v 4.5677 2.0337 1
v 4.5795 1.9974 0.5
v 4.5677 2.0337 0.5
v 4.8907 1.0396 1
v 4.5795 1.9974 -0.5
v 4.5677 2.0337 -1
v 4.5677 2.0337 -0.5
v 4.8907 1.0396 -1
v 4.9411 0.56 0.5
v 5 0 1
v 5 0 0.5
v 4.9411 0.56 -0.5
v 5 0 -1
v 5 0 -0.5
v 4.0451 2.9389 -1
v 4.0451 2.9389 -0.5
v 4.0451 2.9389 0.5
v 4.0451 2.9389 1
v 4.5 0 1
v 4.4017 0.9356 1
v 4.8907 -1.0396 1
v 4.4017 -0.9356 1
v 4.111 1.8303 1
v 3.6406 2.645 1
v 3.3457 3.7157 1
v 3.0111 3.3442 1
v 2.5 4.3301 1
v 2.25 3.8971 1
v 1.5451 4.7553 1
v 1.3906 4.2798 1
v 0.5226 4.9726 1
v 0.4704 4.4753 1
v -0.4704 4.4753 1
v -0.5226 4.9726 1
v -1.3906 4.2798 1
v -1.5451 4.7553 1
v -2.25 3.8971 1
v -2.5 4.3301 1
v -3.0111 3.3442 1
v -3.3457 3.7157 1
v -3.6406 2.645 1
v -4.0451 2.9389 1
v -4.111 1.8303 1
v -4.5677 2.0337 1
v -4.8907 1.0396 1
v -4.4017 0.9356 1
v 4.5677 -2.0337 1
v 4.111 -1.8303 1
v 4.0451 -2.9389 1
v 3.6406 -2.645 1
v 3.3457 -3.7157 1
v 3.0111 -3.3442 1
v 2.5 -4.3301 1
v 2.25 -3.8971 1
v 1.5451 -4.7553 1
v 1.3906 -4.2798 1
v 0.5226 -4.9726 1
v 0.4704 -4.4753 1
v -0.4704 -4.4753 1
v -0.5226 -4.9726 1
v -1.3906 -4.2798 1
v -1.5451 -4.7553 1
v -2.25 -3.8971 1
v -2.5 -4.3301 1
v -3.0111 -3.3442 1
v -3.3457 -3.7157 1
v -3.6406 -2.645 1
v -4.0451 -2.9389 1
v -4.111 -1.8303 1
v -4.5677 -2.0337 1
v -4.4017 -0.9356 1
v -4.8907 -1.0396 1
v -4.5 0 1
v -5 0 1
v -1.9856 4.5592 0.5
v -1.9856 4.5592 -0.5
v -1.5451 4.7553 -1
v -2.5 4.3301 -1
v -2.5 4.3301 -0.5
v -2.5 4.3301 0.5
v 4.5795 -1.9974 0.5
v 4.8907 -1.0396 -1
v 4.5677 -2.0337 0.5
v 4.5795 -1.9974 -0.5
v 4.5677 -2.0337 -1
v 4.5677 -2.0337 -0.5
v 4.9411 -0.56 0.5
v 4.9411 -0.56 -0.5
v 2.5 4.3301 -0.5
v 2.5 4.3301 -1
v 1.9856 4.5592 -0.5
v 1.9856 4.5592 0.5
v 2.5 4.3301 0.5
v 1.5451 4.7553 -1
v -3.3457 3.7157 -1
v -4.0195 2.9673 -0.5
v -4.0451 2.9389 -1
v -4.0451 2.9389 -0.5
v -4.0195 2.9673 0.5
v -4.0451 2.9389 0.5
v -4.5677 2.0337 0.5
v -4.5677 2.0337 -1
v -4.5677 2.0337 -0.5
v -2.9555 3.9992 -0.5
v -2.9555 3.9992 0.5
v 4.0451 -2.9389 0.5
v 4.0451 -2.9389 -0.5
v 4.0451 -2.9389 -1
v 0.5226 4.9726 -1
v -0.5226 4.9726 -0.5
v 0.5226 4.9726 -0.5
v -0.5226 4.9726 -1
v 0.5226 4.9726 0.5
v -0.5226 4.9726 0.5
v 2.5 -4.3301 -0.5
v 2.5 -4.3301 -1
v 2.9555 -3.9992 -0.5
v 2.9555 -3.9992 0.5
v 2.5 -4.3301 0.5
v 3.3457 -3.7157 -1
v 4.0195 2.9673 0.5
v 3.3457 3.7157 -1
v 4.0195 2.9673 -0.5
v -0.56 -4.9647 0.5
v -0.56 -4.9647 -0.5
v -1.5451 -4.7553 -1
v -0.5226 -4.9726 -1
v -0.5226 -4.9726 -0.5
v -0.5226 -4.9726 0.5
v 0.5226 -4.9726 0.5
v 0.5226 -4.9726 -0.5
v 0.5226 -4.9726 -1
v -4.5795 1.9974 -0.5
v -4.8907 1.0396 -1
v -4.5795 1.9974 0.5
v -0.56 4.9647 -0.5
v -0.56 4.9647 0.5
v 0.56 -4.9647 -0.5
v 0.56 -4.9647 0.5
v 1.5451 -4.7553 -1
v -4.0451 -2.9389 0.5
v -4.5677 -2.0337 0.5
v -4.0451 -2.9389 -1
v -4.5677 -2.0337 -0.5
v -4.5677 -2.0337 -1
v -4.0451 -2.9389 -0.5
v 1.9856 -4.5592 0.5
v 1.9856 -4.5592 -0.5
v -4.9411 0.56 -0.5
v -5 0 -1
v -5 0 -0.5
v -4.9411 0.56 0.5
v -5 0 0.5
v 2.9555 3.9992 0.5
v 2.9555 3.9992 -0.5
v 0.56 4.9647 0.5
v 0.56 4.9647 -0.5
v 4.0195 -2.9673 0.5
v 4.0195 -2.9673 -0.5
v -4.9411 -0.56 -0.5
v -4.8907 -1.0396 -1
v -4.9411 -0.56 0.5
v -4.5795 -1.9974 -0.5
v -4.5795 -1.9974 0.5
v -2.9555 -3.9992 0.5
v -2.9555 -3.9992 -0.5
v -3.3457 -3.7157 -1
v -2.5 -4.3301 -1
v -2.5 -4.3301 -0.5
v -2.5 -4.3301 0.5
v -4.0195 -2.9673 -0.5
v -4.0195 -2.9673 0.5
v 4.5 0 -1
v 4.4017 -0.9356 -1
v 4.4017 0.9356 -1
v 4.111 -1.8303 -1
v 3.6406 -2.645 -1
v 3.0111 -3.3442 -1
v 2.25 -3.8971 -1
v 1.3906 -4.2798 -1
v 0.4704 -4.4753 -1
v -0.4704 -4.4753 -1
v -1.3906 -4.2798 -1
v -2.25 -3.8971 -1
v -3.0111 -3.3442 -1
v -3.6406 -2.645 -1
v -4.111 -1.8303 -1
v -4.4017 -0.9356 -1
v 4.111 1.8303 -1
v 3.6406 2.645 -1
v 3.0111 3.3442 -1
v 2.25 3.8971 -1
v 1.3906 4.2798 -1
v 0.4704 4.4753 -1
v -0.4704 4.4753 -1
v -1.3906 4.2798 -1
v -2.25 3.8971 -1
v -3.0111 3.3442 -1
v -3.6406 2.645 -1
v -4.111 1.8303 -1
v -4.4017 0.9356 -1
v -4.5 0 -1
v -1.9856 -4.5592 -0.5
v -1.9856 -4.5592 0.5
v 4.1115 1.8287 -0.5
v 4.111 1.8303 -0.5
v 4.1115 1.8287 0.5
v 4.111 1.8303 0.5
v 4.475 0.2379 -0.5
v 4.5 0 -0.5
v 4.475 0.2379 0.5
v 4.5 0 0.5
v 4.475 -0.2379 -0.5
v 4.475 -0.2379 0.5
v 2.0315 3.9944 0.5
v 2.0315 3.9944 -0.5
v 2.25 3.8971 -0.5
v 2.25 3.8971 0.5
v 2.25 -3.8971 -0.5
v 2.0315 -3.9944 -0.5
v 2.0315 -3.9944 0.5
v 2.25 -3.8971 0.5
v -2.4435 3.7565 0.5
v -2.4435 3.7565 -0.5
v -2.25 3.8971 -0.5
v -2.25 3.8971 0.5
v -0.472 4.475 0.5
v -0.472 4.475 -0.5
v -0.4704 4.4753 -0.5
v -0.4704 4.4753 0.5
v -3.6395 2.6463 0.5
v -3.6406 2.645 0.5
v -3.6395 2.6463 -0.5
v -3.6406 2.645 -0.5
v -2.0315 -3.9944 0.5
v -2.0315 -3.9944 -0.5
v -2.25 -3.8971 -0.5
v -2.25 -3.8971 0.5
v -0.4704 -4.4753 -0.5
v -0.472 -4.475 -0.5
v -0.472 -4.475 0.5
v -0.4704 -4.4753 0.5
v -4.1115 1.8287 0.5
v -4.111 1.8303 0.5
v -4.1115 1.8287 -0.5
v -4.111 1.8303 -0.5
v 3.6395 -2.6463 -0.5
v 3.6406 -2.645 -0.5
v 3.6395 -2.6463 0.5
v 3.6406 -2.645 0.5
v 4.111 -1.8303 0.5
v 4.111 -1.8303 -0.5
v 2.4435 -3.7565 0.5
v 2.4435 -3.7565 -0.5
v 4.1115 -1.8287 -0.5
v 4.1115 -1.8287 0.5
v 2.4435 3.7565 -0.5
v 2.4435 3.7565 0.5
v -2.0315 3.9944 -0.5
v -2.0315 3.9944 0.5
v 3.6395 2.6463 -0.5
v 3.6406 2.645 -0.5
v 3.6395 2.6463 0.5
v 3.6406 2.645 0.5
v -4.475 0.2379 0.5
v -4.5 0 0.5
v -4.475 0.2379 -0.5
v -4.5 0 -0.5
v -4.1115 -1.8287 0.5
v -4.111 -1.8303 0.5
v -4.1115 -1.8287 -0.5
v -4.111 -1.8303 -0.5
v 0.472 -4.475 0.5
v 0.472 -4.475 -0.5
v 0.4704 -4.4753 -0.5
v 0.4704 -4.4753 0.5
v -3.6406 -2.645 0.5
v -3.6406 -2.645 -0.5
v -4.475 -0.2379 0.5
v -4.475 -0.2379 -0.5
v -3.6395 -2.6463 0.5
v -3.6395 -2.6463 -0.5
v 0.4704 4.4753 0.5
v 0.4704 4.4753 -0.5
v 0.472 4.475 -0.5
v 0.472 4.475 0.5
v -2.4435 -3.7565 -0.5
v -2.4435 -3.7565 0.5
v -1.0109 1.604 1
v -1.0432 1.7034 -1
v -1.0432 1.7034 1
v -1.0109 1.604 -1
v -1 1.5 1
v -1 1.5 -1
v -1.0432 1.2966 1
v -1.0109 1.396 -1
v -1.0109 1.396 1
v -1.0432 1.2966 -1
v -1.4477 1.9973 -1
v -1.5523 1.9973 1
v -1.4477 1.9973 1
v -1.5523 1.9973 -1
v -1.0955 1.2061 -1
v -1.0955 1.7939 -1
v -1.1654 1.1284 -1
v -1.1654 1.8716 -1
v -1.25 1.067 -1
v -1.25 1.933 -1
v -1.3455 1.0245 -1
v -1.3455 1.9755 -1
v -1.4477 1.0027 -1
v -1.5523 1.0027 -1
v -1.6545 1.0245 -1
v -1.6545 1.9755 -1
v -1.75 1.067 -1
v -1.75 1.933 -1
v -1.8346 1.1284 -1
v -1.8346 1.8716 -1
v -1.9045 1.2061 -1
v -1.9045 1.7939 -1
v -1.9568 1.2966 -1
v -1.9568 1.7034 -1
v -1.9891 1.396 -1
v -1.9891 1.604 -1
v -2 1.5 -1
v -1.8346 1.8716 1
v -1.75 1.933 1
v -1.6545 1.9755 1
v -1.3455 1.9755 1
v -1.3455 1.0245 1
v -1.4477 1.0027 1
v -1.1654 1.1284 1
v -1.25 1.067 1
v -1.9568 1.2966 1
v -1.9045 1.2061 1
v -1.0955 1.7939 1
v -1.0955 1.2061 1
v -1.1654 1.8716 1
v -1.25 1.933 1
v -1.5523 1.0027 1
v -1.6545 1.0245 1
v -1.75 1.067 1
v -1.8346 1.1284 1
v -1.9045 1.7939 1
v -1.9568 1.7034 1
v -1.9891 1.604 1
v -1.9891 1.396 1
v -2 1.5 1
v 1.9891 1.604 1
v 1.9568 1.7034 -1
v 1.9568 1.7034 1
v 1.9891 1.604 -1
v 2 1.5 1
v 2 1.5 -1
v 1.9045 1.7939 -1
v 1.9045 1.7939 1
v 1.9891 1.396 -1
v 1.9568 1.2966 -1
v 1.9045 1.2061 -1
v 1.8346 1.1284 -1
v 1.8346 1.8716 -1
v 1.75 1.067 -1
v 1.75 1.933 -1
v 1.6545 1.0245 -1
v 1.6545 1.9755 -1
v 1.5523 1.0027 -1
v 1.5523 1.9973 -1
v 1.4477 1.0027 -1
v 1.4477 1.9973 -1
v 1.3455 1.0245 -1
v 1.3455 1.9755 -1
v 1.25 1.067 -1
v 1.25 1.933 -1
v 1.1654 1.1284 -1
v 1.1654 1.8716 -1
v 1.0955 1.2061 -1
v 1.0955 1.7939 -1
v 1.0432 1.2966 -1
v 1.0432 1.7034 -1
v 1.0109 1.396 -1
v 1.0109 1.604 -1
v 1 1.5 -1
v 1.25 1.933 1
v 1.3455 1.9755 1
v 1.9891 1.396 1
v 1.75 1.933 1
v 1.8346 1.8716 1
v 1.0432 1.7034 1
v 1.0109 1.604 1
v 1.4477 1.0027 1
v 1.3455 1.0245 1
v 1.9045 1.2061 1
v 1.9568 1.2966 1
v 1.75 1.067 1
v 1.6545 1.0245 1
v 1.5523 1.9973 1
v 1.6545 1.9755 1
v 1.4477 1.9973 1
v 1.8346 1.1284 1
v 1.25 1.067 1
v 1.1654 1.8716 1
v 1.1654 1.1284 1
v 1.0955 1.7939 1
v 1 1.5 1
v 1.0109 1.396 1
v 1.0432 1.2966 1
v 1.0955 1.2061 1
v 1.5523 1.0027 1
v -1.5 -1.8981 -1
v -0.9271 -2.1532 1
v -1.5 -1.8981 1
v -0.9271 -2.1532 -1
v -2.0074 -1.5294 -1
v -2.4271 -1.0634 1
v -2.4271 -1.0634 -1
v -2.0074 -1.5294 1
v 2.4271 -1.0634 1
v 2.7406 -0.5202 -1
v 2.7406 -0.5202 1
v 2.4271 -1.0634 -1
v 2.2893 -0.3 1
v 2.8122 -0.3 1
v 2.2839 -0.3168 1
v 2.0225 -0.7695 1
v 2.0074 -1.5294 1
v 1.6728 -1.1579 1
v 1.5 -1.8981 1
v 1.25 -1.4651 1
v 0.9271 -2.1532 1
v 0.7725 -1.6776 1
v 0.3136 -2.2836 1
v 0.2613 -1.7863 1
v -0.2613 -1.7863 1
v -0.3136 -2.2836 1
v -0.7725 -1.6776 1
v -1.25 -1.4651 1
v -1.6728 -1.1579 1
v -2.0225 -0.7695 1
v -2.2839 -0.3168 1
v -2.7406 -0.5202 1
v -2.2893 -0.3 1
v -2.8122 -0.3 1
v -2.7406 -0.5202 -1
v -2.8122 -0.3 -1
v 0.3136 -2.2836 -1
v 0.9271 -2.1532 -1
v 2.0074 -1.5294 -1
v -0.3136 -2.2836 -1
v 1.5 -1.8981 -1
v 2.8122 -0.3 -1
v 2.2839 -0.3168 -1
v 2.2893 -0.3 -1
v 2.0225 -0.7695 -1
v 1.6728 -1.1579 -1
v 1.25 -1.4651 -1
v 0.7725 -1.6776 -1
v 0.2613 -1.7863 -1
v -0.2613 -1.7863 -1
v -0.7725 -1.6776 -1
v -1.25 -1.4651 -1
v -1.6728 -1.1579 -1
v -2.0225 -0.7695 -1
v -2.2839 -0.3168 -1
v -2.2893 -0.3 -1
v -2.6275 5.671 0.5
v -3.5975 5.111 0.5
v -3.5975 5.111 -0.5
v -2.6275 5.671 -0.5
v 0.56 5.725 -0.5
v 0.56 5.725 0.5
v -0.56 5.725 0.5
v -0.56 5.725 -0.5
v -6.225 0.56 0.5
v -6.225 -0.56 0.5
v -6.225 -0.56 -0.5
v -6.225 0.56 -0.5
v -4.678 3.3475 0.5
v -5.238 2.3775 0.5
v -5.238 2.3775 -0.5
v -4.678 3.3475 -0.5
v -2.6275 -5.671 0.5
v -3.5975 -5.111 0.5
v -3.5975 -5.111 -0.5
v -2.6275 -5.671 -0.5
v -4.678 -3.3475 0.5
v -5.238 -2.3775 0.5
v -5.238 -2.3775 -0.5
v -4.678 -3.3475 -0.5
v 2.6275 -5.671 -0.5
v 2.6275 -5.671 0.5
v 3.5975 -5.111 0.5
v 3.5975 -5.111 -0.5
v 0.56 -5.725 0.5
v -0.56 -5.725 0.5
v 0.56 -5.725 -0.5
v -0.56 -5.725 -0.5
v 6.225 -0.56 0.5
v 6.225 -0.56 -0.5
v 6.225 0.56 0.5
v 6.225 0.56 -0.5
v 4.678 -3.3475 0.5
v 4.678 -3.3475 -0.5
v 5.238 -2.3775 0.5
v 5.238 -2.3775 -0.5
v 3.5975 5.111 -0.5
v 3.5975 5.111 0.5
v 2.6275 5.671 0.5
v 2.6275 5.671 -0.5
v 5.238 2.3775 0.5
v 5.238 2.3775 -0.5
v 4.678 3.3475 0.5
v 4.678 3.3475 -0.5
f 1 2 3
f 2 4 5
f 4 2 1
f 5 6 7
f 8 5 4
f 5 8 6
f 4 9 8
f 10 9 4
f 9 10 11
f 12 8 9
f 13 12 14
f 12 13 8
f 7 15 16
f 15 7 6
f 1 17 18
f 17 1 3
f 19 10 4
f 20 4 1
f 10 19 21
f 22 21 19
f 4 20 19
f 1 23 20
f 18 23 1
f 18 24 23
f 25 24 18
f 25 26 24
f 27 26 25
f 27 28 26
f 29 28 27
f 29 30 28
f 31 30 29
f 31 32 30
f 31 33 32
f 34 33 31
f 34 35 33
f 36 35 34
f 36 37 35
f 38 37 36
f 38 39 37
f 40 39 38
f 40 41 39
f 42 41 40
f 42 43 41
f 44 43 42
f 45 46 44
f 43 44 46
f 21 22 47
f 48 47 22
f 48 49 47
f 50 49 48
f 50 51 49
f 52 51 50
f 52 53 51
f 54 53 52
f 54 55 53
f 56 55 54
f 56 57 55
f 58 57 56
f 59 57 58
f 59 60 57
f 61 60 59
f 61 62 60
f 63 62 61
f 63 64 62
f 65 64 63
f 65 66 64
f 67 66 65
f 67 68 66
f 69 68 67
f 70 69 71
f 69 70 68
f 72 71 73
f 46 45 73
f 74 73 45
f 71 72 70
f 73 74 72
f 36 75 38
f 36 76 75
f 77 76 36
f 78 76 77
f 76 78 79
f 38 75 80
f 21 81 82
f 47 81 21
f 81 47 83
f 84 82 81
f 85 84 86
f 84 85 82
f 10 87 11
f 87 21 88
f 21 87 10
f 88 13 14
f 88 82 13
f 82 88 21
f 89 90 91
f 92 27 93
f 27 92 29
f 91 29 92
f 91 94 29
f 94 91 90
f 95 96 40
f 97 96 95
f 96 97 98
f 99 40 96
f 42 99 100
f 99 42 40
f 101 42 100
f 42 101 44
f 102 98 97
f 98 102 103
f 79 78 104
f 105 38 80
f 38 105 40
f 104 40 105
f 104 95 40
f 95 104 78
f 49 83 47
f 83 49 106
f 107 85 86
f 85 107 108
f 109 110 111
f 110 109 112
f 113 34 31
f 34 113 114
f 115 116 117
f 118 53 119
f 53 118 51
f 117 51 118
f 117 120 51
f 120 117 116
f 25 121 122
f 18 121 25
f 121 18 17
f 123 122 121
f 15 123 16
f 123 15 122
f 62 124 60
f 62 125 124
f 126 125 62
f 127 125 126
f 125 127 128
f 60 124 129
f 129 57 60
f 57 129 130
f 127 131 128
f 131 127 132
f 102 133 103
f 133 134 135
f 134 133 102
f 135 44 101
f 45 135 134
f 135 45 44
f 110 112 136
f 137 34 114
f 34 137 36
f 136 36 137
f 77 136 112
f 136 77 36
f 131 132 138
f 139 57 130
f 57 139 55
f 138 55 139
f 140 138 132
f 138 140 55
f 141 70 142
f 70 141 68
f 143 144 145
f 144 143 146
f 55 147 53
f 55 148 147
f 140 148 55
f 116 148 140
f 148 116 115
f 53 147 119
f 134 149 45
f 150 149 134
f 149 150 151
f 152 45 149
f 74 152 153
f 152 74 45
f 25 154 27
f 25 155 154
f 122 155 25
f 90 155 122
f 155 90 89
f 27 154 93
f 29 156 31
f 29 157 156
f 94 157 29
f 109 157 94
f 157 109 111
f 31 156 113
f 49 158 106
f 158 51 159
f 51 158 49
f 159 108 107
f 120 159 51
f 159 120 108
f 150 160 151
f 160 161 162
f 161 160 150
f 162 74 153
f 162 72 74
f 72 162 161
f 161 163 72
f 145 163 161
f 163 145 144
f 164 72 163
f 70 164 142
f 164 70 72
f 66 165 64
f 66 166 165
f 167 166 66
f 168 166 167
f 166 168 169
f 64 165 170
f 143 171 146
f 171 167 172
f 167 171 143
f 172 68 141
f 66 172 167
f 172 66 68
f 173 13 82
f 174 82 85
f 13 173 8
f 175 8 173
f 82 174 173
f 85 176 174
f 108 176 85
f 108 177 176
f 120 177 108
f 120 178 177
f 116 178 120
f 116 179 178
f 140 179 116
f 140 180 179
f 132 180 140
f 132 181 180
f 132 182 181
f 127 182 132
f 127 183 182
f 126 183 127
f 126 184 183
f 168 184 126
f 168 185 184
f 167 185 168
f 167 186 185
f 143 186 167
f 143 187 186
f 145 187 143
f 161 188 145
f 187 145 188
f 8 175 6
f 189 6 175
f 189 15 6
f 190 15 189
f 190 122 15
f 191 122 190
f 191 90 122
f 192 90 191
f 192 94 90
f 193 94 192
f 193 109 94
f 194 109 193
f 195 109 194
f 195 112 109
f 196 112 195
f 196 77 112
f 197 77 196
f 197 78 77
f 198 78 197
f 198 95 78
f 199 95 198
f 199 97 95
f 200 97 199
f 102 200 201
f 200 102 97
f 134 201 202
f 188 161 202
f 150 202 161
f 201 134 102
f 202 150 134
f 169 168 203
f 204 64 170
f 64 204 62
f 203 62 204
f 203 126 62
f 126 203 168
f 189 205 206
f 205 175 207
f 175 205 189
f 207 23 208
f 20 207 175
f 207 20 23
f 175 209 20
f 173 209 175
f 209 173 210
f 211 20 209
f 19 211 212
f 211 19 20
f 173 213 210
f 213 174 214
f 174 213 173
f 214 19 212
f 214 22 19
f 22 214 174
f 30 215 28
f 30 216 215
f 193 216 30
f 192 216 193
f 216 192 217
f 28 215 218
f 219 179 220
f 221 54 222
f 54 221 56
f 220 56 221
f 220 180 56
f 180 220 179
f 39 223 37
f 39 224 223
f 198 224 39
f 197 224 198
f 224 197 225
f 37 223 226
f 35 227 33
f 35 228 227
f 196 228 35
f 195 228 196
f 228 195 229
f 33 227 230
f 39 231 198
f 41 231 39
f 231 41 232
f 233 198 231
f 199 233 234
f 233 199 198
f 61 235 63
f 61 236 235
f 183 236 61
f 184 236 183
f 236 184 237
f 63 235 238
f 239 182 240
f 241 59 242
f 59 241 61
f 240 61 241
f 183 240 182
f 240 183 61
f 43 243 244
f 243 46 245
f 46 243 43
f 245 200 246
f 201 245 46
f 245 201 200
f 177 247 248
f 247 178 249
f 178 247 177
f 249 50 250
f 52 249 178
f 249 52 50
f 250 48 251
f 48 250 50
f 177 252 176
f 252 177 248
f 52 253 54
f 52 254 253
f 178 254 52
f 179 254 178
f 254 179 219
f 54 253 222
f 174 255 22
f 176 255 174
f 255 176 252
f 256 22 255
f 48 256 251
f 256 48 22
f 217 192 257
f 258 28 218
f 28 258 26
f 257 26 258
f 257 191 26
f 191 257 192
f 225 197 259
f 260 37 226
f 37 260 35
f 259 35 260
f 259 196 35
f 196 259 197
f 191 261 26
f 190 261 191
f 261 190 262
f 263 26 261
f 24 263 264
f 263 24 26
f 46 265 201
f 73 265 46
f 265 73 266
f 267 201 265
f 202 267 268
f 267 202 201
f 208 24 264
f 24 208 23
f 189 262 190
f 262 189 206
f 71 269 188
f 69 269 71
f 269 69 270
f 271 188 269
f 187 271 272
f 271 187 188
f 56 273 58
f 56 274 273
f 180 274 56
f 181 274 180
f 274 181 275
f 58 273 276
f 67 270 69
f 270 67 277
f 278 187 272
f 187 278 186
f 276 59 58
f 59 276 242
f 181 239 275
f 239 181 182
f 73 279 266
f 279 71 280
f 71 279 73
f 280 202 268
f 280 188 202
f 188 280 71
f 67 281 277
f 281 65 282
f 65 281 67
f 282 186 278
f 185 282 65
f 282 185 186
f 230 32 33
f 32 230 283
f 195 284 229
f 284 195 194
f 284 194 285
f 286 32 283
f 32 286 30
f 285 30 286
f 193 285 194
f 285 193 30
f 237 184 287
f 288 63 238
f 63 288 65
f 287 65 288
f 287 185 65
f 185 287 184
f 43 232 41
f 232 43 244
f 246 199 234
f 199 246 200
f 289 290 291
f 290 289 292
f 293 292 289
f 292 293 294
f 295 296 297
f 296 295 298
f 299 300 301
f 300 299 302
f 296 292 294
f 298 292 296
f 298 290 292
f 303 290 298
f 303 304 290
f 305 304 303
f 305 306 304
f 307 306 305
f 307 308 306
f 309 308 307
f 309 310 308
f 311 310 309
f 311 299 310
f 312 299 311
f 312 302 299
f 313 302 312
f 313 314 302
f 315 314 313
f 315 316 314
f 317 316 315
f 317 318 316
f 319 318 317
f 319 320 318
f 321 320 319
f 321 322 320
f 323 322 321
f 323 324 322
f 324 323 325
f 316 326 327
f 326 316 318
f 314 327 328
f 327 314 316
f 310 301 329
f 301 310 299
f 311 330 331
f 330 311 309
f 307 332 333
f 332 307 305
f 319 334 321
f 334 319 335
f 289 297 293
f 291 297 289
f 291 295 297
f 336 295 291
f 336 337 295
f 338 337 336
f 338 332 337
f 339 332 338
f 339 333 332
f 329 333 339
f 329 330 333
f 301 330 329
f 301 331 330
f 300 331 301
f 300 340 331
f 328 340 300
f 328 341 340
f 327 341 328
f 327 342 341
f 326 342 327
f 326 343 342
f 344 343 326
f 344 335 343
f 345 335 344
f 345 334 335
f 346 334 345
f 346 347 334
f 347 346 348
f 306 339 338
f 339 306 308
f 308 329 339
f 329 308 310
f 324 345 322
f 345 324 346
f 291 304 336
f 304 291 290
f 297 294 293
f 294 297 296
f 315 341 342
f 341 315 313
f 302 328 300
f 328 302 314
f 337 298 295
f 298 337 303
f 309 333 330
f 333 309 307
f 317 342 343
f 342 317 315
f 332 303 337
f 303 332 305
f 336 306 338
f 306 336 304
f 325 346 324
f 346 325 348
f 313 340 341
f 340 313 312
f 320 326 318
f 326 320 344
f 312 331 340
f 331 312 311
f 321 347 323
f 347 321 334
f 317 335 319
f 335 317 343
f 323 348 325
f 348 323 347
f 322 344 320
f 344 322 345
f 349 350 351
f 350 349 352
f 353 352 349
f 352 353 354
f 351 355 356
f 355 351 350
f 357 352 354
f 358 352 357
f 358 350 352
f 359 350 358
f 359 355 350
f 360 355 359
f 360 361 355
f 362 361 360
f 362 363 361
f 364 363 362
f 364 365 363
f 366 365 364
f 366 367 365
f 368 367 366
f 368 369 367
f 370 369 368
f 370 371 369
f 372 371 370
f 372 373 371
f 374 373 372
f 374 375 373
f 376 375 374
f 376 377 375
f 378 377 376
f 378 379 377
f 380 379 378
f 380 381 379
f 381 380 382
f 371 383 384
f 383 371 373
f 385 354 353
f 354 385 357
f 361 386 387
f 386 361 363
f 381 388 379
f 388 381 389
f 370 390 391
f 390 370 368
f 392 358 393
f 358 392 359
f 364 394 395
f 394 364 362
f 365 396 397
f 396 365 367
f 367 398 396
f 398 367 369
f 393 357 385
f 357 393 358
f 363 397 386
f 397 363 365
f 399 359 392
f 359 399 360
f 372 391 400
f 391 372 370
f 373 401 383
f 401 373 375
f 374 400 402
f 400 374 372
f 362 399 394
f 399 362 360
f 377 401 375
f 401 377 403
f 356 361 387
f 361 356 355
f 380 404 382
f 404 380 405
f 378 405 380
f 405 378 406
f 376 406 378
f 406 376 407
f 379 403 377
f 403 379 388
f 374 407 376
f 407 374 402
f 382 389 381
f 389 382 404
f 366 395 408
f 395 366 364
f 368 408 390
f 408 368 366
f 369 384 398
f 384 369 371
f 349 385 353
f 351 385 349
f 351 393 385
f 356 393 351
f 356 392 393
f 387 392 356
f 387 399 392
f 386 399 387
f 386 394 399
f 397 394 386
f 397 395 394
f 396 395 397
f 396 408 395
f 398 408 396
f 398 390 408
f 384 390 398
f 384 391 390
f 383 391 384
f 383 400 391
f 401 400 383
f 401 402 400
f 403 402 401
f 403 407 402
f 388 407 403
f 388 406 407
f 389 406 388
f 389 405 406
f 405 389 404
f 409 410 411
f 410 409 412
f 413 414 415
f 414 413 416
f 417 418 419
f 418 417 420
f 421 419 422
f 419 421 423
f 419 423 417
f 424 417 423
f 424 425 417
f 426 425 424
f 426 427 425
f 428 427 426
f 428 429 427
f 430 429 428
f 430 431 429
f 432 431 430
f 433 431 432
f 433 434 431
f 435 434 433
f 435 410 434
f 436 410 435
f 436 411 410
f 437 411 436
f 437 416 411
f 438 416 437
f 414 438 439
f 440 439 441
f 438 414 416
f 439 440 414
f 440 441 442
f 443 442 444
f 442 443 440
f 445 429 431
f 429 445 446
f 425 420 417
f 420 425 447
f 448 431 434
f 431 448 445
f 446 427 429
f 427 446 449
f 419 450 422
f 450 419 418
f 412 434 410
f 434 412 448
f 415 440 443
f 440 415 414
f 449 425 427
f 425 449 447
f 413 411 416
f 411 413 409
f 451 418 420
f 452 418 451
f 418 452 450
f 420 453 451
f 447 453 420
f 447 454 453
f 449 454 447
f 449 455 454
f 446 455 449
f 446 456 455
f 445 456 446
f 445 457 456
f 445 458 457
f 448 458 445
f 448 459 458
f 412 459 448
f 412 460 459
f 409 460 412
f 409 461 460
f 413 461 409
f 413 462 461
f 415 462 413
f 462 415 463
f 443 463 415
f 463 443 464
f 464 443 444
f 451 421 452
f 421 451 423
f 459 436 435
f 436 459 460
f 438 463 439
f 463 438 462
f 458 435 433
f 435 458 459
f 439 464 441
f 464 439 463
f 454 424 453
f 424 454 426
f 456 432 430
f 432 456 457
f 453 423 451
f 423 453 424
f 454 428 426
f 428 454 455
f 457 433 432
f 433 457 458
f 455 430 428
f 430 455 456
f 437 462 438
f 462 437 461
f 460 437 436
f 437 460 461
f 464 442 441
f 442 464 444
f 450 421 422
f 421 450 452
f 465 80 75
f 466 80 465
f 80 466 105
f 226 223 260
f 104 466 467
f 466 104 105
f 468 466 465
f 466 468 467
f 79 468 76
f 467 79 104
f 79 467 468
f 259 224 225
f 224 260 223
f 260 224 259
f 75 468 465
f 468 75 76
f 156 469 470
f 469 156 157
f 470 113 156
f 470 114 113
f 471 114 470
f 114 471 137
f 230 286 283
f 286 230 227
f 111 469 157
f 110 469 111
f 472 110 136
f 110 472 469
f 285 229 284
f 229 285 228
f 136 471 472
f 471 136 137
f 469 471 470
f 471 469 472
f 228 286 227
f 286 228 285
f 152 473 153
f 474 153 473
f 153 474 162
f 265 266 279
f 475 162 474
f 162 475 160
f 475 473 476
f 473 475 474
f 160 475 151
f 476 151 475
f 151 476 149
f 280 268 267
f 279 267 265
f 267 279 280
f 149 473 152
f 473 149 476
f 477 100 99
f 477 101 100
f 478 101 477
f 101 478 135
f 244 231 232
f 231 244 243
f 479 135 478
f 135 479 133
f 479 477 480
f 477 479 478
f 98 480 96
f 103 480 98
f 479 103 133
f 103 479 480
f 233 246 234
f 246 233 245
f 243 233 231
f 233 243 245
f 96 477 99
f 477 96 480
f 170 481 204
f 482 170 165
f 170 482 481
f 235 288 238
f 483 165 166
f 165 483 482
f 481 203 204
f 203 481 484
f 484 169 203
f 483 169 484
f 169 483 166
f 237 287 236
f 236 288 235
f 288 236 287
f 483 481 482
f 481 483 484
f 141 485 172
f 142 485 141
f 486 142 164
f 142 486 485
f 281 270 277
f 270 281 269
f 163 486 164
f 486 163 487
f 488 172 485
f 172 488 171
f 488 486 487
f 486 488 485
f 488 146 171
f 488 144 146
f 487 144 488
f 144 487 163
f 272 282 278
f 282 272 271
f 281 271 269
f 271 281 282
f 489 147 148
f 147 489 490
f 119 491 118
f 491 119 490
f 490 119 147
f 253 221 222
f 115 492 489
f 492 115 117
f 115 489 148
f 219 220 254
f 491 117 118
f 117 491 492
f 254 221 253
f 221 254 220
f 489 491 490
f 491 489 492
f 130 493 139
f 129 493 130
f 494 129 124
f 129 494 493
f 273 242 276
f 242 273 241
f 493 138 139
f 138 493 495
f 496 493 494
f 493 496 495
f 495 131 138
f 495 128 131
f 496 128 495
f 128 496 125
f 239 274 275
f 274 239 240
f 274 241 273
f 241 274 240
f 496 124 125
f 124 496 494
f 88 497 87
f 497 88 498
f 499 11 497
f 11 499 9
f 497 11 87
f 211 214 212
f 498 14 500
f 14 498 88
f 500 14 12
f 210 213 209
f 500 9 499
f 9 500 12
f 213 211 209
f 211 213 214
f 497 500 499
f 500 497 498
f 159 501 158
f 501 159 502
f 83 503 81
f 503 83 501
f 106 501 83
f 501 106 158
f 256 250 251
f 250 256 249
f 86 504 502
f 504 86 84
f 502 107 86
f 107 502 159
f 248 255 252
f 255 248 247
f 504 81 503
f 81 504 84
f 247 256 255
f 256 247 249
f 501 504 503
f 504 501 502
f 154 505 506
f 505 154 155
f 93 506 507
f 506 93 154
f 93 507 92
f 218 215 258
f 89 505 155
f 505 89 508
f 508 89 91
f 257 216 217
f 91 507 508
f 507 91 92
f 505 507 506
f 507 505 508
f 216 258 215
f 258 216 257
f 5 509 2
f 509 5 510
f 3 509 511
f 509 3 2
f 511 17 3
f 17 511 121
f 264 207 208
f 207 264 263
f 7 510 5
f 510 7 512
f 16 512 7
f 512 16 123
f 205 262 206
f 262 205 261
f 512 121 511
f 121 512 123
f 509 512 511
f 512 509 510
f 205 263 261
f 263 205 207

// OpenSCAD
sfn=30;

color("black", 1.0) {
    difference() {
        cylinder(r=5, h=2, $fn=sfn, center=true);
        cylinder(r=4.5, h=5, $fn=sfn, center=true);
    }

    for(i = [-1, 1]) {
        translate([1.5*i,1.5,0])cylinder(r=0.5,h=2, $fn=sfn, center=true);
    }


    translate([0,0.7,0]) difference() {
        cylinder(r=3, h=2, $fn=sfn, center=true);
        cylinder(r=2.5, h=5, $fn=sfn, center=true);
        translate([0,4,0]) cube([10,10,5], center=true);
    }
    for(i=[0:6]) {
        rotate([0,0,i*60 + 30]) 
            translate([0,5.35, 0])
                cube([1.12, 1.75, 1], center=true);
        rotate([0,0,i*60]) 
            translate([0,5.1,0])
                cube([1.12, 1.25, 1], center=true);
    }
} 
